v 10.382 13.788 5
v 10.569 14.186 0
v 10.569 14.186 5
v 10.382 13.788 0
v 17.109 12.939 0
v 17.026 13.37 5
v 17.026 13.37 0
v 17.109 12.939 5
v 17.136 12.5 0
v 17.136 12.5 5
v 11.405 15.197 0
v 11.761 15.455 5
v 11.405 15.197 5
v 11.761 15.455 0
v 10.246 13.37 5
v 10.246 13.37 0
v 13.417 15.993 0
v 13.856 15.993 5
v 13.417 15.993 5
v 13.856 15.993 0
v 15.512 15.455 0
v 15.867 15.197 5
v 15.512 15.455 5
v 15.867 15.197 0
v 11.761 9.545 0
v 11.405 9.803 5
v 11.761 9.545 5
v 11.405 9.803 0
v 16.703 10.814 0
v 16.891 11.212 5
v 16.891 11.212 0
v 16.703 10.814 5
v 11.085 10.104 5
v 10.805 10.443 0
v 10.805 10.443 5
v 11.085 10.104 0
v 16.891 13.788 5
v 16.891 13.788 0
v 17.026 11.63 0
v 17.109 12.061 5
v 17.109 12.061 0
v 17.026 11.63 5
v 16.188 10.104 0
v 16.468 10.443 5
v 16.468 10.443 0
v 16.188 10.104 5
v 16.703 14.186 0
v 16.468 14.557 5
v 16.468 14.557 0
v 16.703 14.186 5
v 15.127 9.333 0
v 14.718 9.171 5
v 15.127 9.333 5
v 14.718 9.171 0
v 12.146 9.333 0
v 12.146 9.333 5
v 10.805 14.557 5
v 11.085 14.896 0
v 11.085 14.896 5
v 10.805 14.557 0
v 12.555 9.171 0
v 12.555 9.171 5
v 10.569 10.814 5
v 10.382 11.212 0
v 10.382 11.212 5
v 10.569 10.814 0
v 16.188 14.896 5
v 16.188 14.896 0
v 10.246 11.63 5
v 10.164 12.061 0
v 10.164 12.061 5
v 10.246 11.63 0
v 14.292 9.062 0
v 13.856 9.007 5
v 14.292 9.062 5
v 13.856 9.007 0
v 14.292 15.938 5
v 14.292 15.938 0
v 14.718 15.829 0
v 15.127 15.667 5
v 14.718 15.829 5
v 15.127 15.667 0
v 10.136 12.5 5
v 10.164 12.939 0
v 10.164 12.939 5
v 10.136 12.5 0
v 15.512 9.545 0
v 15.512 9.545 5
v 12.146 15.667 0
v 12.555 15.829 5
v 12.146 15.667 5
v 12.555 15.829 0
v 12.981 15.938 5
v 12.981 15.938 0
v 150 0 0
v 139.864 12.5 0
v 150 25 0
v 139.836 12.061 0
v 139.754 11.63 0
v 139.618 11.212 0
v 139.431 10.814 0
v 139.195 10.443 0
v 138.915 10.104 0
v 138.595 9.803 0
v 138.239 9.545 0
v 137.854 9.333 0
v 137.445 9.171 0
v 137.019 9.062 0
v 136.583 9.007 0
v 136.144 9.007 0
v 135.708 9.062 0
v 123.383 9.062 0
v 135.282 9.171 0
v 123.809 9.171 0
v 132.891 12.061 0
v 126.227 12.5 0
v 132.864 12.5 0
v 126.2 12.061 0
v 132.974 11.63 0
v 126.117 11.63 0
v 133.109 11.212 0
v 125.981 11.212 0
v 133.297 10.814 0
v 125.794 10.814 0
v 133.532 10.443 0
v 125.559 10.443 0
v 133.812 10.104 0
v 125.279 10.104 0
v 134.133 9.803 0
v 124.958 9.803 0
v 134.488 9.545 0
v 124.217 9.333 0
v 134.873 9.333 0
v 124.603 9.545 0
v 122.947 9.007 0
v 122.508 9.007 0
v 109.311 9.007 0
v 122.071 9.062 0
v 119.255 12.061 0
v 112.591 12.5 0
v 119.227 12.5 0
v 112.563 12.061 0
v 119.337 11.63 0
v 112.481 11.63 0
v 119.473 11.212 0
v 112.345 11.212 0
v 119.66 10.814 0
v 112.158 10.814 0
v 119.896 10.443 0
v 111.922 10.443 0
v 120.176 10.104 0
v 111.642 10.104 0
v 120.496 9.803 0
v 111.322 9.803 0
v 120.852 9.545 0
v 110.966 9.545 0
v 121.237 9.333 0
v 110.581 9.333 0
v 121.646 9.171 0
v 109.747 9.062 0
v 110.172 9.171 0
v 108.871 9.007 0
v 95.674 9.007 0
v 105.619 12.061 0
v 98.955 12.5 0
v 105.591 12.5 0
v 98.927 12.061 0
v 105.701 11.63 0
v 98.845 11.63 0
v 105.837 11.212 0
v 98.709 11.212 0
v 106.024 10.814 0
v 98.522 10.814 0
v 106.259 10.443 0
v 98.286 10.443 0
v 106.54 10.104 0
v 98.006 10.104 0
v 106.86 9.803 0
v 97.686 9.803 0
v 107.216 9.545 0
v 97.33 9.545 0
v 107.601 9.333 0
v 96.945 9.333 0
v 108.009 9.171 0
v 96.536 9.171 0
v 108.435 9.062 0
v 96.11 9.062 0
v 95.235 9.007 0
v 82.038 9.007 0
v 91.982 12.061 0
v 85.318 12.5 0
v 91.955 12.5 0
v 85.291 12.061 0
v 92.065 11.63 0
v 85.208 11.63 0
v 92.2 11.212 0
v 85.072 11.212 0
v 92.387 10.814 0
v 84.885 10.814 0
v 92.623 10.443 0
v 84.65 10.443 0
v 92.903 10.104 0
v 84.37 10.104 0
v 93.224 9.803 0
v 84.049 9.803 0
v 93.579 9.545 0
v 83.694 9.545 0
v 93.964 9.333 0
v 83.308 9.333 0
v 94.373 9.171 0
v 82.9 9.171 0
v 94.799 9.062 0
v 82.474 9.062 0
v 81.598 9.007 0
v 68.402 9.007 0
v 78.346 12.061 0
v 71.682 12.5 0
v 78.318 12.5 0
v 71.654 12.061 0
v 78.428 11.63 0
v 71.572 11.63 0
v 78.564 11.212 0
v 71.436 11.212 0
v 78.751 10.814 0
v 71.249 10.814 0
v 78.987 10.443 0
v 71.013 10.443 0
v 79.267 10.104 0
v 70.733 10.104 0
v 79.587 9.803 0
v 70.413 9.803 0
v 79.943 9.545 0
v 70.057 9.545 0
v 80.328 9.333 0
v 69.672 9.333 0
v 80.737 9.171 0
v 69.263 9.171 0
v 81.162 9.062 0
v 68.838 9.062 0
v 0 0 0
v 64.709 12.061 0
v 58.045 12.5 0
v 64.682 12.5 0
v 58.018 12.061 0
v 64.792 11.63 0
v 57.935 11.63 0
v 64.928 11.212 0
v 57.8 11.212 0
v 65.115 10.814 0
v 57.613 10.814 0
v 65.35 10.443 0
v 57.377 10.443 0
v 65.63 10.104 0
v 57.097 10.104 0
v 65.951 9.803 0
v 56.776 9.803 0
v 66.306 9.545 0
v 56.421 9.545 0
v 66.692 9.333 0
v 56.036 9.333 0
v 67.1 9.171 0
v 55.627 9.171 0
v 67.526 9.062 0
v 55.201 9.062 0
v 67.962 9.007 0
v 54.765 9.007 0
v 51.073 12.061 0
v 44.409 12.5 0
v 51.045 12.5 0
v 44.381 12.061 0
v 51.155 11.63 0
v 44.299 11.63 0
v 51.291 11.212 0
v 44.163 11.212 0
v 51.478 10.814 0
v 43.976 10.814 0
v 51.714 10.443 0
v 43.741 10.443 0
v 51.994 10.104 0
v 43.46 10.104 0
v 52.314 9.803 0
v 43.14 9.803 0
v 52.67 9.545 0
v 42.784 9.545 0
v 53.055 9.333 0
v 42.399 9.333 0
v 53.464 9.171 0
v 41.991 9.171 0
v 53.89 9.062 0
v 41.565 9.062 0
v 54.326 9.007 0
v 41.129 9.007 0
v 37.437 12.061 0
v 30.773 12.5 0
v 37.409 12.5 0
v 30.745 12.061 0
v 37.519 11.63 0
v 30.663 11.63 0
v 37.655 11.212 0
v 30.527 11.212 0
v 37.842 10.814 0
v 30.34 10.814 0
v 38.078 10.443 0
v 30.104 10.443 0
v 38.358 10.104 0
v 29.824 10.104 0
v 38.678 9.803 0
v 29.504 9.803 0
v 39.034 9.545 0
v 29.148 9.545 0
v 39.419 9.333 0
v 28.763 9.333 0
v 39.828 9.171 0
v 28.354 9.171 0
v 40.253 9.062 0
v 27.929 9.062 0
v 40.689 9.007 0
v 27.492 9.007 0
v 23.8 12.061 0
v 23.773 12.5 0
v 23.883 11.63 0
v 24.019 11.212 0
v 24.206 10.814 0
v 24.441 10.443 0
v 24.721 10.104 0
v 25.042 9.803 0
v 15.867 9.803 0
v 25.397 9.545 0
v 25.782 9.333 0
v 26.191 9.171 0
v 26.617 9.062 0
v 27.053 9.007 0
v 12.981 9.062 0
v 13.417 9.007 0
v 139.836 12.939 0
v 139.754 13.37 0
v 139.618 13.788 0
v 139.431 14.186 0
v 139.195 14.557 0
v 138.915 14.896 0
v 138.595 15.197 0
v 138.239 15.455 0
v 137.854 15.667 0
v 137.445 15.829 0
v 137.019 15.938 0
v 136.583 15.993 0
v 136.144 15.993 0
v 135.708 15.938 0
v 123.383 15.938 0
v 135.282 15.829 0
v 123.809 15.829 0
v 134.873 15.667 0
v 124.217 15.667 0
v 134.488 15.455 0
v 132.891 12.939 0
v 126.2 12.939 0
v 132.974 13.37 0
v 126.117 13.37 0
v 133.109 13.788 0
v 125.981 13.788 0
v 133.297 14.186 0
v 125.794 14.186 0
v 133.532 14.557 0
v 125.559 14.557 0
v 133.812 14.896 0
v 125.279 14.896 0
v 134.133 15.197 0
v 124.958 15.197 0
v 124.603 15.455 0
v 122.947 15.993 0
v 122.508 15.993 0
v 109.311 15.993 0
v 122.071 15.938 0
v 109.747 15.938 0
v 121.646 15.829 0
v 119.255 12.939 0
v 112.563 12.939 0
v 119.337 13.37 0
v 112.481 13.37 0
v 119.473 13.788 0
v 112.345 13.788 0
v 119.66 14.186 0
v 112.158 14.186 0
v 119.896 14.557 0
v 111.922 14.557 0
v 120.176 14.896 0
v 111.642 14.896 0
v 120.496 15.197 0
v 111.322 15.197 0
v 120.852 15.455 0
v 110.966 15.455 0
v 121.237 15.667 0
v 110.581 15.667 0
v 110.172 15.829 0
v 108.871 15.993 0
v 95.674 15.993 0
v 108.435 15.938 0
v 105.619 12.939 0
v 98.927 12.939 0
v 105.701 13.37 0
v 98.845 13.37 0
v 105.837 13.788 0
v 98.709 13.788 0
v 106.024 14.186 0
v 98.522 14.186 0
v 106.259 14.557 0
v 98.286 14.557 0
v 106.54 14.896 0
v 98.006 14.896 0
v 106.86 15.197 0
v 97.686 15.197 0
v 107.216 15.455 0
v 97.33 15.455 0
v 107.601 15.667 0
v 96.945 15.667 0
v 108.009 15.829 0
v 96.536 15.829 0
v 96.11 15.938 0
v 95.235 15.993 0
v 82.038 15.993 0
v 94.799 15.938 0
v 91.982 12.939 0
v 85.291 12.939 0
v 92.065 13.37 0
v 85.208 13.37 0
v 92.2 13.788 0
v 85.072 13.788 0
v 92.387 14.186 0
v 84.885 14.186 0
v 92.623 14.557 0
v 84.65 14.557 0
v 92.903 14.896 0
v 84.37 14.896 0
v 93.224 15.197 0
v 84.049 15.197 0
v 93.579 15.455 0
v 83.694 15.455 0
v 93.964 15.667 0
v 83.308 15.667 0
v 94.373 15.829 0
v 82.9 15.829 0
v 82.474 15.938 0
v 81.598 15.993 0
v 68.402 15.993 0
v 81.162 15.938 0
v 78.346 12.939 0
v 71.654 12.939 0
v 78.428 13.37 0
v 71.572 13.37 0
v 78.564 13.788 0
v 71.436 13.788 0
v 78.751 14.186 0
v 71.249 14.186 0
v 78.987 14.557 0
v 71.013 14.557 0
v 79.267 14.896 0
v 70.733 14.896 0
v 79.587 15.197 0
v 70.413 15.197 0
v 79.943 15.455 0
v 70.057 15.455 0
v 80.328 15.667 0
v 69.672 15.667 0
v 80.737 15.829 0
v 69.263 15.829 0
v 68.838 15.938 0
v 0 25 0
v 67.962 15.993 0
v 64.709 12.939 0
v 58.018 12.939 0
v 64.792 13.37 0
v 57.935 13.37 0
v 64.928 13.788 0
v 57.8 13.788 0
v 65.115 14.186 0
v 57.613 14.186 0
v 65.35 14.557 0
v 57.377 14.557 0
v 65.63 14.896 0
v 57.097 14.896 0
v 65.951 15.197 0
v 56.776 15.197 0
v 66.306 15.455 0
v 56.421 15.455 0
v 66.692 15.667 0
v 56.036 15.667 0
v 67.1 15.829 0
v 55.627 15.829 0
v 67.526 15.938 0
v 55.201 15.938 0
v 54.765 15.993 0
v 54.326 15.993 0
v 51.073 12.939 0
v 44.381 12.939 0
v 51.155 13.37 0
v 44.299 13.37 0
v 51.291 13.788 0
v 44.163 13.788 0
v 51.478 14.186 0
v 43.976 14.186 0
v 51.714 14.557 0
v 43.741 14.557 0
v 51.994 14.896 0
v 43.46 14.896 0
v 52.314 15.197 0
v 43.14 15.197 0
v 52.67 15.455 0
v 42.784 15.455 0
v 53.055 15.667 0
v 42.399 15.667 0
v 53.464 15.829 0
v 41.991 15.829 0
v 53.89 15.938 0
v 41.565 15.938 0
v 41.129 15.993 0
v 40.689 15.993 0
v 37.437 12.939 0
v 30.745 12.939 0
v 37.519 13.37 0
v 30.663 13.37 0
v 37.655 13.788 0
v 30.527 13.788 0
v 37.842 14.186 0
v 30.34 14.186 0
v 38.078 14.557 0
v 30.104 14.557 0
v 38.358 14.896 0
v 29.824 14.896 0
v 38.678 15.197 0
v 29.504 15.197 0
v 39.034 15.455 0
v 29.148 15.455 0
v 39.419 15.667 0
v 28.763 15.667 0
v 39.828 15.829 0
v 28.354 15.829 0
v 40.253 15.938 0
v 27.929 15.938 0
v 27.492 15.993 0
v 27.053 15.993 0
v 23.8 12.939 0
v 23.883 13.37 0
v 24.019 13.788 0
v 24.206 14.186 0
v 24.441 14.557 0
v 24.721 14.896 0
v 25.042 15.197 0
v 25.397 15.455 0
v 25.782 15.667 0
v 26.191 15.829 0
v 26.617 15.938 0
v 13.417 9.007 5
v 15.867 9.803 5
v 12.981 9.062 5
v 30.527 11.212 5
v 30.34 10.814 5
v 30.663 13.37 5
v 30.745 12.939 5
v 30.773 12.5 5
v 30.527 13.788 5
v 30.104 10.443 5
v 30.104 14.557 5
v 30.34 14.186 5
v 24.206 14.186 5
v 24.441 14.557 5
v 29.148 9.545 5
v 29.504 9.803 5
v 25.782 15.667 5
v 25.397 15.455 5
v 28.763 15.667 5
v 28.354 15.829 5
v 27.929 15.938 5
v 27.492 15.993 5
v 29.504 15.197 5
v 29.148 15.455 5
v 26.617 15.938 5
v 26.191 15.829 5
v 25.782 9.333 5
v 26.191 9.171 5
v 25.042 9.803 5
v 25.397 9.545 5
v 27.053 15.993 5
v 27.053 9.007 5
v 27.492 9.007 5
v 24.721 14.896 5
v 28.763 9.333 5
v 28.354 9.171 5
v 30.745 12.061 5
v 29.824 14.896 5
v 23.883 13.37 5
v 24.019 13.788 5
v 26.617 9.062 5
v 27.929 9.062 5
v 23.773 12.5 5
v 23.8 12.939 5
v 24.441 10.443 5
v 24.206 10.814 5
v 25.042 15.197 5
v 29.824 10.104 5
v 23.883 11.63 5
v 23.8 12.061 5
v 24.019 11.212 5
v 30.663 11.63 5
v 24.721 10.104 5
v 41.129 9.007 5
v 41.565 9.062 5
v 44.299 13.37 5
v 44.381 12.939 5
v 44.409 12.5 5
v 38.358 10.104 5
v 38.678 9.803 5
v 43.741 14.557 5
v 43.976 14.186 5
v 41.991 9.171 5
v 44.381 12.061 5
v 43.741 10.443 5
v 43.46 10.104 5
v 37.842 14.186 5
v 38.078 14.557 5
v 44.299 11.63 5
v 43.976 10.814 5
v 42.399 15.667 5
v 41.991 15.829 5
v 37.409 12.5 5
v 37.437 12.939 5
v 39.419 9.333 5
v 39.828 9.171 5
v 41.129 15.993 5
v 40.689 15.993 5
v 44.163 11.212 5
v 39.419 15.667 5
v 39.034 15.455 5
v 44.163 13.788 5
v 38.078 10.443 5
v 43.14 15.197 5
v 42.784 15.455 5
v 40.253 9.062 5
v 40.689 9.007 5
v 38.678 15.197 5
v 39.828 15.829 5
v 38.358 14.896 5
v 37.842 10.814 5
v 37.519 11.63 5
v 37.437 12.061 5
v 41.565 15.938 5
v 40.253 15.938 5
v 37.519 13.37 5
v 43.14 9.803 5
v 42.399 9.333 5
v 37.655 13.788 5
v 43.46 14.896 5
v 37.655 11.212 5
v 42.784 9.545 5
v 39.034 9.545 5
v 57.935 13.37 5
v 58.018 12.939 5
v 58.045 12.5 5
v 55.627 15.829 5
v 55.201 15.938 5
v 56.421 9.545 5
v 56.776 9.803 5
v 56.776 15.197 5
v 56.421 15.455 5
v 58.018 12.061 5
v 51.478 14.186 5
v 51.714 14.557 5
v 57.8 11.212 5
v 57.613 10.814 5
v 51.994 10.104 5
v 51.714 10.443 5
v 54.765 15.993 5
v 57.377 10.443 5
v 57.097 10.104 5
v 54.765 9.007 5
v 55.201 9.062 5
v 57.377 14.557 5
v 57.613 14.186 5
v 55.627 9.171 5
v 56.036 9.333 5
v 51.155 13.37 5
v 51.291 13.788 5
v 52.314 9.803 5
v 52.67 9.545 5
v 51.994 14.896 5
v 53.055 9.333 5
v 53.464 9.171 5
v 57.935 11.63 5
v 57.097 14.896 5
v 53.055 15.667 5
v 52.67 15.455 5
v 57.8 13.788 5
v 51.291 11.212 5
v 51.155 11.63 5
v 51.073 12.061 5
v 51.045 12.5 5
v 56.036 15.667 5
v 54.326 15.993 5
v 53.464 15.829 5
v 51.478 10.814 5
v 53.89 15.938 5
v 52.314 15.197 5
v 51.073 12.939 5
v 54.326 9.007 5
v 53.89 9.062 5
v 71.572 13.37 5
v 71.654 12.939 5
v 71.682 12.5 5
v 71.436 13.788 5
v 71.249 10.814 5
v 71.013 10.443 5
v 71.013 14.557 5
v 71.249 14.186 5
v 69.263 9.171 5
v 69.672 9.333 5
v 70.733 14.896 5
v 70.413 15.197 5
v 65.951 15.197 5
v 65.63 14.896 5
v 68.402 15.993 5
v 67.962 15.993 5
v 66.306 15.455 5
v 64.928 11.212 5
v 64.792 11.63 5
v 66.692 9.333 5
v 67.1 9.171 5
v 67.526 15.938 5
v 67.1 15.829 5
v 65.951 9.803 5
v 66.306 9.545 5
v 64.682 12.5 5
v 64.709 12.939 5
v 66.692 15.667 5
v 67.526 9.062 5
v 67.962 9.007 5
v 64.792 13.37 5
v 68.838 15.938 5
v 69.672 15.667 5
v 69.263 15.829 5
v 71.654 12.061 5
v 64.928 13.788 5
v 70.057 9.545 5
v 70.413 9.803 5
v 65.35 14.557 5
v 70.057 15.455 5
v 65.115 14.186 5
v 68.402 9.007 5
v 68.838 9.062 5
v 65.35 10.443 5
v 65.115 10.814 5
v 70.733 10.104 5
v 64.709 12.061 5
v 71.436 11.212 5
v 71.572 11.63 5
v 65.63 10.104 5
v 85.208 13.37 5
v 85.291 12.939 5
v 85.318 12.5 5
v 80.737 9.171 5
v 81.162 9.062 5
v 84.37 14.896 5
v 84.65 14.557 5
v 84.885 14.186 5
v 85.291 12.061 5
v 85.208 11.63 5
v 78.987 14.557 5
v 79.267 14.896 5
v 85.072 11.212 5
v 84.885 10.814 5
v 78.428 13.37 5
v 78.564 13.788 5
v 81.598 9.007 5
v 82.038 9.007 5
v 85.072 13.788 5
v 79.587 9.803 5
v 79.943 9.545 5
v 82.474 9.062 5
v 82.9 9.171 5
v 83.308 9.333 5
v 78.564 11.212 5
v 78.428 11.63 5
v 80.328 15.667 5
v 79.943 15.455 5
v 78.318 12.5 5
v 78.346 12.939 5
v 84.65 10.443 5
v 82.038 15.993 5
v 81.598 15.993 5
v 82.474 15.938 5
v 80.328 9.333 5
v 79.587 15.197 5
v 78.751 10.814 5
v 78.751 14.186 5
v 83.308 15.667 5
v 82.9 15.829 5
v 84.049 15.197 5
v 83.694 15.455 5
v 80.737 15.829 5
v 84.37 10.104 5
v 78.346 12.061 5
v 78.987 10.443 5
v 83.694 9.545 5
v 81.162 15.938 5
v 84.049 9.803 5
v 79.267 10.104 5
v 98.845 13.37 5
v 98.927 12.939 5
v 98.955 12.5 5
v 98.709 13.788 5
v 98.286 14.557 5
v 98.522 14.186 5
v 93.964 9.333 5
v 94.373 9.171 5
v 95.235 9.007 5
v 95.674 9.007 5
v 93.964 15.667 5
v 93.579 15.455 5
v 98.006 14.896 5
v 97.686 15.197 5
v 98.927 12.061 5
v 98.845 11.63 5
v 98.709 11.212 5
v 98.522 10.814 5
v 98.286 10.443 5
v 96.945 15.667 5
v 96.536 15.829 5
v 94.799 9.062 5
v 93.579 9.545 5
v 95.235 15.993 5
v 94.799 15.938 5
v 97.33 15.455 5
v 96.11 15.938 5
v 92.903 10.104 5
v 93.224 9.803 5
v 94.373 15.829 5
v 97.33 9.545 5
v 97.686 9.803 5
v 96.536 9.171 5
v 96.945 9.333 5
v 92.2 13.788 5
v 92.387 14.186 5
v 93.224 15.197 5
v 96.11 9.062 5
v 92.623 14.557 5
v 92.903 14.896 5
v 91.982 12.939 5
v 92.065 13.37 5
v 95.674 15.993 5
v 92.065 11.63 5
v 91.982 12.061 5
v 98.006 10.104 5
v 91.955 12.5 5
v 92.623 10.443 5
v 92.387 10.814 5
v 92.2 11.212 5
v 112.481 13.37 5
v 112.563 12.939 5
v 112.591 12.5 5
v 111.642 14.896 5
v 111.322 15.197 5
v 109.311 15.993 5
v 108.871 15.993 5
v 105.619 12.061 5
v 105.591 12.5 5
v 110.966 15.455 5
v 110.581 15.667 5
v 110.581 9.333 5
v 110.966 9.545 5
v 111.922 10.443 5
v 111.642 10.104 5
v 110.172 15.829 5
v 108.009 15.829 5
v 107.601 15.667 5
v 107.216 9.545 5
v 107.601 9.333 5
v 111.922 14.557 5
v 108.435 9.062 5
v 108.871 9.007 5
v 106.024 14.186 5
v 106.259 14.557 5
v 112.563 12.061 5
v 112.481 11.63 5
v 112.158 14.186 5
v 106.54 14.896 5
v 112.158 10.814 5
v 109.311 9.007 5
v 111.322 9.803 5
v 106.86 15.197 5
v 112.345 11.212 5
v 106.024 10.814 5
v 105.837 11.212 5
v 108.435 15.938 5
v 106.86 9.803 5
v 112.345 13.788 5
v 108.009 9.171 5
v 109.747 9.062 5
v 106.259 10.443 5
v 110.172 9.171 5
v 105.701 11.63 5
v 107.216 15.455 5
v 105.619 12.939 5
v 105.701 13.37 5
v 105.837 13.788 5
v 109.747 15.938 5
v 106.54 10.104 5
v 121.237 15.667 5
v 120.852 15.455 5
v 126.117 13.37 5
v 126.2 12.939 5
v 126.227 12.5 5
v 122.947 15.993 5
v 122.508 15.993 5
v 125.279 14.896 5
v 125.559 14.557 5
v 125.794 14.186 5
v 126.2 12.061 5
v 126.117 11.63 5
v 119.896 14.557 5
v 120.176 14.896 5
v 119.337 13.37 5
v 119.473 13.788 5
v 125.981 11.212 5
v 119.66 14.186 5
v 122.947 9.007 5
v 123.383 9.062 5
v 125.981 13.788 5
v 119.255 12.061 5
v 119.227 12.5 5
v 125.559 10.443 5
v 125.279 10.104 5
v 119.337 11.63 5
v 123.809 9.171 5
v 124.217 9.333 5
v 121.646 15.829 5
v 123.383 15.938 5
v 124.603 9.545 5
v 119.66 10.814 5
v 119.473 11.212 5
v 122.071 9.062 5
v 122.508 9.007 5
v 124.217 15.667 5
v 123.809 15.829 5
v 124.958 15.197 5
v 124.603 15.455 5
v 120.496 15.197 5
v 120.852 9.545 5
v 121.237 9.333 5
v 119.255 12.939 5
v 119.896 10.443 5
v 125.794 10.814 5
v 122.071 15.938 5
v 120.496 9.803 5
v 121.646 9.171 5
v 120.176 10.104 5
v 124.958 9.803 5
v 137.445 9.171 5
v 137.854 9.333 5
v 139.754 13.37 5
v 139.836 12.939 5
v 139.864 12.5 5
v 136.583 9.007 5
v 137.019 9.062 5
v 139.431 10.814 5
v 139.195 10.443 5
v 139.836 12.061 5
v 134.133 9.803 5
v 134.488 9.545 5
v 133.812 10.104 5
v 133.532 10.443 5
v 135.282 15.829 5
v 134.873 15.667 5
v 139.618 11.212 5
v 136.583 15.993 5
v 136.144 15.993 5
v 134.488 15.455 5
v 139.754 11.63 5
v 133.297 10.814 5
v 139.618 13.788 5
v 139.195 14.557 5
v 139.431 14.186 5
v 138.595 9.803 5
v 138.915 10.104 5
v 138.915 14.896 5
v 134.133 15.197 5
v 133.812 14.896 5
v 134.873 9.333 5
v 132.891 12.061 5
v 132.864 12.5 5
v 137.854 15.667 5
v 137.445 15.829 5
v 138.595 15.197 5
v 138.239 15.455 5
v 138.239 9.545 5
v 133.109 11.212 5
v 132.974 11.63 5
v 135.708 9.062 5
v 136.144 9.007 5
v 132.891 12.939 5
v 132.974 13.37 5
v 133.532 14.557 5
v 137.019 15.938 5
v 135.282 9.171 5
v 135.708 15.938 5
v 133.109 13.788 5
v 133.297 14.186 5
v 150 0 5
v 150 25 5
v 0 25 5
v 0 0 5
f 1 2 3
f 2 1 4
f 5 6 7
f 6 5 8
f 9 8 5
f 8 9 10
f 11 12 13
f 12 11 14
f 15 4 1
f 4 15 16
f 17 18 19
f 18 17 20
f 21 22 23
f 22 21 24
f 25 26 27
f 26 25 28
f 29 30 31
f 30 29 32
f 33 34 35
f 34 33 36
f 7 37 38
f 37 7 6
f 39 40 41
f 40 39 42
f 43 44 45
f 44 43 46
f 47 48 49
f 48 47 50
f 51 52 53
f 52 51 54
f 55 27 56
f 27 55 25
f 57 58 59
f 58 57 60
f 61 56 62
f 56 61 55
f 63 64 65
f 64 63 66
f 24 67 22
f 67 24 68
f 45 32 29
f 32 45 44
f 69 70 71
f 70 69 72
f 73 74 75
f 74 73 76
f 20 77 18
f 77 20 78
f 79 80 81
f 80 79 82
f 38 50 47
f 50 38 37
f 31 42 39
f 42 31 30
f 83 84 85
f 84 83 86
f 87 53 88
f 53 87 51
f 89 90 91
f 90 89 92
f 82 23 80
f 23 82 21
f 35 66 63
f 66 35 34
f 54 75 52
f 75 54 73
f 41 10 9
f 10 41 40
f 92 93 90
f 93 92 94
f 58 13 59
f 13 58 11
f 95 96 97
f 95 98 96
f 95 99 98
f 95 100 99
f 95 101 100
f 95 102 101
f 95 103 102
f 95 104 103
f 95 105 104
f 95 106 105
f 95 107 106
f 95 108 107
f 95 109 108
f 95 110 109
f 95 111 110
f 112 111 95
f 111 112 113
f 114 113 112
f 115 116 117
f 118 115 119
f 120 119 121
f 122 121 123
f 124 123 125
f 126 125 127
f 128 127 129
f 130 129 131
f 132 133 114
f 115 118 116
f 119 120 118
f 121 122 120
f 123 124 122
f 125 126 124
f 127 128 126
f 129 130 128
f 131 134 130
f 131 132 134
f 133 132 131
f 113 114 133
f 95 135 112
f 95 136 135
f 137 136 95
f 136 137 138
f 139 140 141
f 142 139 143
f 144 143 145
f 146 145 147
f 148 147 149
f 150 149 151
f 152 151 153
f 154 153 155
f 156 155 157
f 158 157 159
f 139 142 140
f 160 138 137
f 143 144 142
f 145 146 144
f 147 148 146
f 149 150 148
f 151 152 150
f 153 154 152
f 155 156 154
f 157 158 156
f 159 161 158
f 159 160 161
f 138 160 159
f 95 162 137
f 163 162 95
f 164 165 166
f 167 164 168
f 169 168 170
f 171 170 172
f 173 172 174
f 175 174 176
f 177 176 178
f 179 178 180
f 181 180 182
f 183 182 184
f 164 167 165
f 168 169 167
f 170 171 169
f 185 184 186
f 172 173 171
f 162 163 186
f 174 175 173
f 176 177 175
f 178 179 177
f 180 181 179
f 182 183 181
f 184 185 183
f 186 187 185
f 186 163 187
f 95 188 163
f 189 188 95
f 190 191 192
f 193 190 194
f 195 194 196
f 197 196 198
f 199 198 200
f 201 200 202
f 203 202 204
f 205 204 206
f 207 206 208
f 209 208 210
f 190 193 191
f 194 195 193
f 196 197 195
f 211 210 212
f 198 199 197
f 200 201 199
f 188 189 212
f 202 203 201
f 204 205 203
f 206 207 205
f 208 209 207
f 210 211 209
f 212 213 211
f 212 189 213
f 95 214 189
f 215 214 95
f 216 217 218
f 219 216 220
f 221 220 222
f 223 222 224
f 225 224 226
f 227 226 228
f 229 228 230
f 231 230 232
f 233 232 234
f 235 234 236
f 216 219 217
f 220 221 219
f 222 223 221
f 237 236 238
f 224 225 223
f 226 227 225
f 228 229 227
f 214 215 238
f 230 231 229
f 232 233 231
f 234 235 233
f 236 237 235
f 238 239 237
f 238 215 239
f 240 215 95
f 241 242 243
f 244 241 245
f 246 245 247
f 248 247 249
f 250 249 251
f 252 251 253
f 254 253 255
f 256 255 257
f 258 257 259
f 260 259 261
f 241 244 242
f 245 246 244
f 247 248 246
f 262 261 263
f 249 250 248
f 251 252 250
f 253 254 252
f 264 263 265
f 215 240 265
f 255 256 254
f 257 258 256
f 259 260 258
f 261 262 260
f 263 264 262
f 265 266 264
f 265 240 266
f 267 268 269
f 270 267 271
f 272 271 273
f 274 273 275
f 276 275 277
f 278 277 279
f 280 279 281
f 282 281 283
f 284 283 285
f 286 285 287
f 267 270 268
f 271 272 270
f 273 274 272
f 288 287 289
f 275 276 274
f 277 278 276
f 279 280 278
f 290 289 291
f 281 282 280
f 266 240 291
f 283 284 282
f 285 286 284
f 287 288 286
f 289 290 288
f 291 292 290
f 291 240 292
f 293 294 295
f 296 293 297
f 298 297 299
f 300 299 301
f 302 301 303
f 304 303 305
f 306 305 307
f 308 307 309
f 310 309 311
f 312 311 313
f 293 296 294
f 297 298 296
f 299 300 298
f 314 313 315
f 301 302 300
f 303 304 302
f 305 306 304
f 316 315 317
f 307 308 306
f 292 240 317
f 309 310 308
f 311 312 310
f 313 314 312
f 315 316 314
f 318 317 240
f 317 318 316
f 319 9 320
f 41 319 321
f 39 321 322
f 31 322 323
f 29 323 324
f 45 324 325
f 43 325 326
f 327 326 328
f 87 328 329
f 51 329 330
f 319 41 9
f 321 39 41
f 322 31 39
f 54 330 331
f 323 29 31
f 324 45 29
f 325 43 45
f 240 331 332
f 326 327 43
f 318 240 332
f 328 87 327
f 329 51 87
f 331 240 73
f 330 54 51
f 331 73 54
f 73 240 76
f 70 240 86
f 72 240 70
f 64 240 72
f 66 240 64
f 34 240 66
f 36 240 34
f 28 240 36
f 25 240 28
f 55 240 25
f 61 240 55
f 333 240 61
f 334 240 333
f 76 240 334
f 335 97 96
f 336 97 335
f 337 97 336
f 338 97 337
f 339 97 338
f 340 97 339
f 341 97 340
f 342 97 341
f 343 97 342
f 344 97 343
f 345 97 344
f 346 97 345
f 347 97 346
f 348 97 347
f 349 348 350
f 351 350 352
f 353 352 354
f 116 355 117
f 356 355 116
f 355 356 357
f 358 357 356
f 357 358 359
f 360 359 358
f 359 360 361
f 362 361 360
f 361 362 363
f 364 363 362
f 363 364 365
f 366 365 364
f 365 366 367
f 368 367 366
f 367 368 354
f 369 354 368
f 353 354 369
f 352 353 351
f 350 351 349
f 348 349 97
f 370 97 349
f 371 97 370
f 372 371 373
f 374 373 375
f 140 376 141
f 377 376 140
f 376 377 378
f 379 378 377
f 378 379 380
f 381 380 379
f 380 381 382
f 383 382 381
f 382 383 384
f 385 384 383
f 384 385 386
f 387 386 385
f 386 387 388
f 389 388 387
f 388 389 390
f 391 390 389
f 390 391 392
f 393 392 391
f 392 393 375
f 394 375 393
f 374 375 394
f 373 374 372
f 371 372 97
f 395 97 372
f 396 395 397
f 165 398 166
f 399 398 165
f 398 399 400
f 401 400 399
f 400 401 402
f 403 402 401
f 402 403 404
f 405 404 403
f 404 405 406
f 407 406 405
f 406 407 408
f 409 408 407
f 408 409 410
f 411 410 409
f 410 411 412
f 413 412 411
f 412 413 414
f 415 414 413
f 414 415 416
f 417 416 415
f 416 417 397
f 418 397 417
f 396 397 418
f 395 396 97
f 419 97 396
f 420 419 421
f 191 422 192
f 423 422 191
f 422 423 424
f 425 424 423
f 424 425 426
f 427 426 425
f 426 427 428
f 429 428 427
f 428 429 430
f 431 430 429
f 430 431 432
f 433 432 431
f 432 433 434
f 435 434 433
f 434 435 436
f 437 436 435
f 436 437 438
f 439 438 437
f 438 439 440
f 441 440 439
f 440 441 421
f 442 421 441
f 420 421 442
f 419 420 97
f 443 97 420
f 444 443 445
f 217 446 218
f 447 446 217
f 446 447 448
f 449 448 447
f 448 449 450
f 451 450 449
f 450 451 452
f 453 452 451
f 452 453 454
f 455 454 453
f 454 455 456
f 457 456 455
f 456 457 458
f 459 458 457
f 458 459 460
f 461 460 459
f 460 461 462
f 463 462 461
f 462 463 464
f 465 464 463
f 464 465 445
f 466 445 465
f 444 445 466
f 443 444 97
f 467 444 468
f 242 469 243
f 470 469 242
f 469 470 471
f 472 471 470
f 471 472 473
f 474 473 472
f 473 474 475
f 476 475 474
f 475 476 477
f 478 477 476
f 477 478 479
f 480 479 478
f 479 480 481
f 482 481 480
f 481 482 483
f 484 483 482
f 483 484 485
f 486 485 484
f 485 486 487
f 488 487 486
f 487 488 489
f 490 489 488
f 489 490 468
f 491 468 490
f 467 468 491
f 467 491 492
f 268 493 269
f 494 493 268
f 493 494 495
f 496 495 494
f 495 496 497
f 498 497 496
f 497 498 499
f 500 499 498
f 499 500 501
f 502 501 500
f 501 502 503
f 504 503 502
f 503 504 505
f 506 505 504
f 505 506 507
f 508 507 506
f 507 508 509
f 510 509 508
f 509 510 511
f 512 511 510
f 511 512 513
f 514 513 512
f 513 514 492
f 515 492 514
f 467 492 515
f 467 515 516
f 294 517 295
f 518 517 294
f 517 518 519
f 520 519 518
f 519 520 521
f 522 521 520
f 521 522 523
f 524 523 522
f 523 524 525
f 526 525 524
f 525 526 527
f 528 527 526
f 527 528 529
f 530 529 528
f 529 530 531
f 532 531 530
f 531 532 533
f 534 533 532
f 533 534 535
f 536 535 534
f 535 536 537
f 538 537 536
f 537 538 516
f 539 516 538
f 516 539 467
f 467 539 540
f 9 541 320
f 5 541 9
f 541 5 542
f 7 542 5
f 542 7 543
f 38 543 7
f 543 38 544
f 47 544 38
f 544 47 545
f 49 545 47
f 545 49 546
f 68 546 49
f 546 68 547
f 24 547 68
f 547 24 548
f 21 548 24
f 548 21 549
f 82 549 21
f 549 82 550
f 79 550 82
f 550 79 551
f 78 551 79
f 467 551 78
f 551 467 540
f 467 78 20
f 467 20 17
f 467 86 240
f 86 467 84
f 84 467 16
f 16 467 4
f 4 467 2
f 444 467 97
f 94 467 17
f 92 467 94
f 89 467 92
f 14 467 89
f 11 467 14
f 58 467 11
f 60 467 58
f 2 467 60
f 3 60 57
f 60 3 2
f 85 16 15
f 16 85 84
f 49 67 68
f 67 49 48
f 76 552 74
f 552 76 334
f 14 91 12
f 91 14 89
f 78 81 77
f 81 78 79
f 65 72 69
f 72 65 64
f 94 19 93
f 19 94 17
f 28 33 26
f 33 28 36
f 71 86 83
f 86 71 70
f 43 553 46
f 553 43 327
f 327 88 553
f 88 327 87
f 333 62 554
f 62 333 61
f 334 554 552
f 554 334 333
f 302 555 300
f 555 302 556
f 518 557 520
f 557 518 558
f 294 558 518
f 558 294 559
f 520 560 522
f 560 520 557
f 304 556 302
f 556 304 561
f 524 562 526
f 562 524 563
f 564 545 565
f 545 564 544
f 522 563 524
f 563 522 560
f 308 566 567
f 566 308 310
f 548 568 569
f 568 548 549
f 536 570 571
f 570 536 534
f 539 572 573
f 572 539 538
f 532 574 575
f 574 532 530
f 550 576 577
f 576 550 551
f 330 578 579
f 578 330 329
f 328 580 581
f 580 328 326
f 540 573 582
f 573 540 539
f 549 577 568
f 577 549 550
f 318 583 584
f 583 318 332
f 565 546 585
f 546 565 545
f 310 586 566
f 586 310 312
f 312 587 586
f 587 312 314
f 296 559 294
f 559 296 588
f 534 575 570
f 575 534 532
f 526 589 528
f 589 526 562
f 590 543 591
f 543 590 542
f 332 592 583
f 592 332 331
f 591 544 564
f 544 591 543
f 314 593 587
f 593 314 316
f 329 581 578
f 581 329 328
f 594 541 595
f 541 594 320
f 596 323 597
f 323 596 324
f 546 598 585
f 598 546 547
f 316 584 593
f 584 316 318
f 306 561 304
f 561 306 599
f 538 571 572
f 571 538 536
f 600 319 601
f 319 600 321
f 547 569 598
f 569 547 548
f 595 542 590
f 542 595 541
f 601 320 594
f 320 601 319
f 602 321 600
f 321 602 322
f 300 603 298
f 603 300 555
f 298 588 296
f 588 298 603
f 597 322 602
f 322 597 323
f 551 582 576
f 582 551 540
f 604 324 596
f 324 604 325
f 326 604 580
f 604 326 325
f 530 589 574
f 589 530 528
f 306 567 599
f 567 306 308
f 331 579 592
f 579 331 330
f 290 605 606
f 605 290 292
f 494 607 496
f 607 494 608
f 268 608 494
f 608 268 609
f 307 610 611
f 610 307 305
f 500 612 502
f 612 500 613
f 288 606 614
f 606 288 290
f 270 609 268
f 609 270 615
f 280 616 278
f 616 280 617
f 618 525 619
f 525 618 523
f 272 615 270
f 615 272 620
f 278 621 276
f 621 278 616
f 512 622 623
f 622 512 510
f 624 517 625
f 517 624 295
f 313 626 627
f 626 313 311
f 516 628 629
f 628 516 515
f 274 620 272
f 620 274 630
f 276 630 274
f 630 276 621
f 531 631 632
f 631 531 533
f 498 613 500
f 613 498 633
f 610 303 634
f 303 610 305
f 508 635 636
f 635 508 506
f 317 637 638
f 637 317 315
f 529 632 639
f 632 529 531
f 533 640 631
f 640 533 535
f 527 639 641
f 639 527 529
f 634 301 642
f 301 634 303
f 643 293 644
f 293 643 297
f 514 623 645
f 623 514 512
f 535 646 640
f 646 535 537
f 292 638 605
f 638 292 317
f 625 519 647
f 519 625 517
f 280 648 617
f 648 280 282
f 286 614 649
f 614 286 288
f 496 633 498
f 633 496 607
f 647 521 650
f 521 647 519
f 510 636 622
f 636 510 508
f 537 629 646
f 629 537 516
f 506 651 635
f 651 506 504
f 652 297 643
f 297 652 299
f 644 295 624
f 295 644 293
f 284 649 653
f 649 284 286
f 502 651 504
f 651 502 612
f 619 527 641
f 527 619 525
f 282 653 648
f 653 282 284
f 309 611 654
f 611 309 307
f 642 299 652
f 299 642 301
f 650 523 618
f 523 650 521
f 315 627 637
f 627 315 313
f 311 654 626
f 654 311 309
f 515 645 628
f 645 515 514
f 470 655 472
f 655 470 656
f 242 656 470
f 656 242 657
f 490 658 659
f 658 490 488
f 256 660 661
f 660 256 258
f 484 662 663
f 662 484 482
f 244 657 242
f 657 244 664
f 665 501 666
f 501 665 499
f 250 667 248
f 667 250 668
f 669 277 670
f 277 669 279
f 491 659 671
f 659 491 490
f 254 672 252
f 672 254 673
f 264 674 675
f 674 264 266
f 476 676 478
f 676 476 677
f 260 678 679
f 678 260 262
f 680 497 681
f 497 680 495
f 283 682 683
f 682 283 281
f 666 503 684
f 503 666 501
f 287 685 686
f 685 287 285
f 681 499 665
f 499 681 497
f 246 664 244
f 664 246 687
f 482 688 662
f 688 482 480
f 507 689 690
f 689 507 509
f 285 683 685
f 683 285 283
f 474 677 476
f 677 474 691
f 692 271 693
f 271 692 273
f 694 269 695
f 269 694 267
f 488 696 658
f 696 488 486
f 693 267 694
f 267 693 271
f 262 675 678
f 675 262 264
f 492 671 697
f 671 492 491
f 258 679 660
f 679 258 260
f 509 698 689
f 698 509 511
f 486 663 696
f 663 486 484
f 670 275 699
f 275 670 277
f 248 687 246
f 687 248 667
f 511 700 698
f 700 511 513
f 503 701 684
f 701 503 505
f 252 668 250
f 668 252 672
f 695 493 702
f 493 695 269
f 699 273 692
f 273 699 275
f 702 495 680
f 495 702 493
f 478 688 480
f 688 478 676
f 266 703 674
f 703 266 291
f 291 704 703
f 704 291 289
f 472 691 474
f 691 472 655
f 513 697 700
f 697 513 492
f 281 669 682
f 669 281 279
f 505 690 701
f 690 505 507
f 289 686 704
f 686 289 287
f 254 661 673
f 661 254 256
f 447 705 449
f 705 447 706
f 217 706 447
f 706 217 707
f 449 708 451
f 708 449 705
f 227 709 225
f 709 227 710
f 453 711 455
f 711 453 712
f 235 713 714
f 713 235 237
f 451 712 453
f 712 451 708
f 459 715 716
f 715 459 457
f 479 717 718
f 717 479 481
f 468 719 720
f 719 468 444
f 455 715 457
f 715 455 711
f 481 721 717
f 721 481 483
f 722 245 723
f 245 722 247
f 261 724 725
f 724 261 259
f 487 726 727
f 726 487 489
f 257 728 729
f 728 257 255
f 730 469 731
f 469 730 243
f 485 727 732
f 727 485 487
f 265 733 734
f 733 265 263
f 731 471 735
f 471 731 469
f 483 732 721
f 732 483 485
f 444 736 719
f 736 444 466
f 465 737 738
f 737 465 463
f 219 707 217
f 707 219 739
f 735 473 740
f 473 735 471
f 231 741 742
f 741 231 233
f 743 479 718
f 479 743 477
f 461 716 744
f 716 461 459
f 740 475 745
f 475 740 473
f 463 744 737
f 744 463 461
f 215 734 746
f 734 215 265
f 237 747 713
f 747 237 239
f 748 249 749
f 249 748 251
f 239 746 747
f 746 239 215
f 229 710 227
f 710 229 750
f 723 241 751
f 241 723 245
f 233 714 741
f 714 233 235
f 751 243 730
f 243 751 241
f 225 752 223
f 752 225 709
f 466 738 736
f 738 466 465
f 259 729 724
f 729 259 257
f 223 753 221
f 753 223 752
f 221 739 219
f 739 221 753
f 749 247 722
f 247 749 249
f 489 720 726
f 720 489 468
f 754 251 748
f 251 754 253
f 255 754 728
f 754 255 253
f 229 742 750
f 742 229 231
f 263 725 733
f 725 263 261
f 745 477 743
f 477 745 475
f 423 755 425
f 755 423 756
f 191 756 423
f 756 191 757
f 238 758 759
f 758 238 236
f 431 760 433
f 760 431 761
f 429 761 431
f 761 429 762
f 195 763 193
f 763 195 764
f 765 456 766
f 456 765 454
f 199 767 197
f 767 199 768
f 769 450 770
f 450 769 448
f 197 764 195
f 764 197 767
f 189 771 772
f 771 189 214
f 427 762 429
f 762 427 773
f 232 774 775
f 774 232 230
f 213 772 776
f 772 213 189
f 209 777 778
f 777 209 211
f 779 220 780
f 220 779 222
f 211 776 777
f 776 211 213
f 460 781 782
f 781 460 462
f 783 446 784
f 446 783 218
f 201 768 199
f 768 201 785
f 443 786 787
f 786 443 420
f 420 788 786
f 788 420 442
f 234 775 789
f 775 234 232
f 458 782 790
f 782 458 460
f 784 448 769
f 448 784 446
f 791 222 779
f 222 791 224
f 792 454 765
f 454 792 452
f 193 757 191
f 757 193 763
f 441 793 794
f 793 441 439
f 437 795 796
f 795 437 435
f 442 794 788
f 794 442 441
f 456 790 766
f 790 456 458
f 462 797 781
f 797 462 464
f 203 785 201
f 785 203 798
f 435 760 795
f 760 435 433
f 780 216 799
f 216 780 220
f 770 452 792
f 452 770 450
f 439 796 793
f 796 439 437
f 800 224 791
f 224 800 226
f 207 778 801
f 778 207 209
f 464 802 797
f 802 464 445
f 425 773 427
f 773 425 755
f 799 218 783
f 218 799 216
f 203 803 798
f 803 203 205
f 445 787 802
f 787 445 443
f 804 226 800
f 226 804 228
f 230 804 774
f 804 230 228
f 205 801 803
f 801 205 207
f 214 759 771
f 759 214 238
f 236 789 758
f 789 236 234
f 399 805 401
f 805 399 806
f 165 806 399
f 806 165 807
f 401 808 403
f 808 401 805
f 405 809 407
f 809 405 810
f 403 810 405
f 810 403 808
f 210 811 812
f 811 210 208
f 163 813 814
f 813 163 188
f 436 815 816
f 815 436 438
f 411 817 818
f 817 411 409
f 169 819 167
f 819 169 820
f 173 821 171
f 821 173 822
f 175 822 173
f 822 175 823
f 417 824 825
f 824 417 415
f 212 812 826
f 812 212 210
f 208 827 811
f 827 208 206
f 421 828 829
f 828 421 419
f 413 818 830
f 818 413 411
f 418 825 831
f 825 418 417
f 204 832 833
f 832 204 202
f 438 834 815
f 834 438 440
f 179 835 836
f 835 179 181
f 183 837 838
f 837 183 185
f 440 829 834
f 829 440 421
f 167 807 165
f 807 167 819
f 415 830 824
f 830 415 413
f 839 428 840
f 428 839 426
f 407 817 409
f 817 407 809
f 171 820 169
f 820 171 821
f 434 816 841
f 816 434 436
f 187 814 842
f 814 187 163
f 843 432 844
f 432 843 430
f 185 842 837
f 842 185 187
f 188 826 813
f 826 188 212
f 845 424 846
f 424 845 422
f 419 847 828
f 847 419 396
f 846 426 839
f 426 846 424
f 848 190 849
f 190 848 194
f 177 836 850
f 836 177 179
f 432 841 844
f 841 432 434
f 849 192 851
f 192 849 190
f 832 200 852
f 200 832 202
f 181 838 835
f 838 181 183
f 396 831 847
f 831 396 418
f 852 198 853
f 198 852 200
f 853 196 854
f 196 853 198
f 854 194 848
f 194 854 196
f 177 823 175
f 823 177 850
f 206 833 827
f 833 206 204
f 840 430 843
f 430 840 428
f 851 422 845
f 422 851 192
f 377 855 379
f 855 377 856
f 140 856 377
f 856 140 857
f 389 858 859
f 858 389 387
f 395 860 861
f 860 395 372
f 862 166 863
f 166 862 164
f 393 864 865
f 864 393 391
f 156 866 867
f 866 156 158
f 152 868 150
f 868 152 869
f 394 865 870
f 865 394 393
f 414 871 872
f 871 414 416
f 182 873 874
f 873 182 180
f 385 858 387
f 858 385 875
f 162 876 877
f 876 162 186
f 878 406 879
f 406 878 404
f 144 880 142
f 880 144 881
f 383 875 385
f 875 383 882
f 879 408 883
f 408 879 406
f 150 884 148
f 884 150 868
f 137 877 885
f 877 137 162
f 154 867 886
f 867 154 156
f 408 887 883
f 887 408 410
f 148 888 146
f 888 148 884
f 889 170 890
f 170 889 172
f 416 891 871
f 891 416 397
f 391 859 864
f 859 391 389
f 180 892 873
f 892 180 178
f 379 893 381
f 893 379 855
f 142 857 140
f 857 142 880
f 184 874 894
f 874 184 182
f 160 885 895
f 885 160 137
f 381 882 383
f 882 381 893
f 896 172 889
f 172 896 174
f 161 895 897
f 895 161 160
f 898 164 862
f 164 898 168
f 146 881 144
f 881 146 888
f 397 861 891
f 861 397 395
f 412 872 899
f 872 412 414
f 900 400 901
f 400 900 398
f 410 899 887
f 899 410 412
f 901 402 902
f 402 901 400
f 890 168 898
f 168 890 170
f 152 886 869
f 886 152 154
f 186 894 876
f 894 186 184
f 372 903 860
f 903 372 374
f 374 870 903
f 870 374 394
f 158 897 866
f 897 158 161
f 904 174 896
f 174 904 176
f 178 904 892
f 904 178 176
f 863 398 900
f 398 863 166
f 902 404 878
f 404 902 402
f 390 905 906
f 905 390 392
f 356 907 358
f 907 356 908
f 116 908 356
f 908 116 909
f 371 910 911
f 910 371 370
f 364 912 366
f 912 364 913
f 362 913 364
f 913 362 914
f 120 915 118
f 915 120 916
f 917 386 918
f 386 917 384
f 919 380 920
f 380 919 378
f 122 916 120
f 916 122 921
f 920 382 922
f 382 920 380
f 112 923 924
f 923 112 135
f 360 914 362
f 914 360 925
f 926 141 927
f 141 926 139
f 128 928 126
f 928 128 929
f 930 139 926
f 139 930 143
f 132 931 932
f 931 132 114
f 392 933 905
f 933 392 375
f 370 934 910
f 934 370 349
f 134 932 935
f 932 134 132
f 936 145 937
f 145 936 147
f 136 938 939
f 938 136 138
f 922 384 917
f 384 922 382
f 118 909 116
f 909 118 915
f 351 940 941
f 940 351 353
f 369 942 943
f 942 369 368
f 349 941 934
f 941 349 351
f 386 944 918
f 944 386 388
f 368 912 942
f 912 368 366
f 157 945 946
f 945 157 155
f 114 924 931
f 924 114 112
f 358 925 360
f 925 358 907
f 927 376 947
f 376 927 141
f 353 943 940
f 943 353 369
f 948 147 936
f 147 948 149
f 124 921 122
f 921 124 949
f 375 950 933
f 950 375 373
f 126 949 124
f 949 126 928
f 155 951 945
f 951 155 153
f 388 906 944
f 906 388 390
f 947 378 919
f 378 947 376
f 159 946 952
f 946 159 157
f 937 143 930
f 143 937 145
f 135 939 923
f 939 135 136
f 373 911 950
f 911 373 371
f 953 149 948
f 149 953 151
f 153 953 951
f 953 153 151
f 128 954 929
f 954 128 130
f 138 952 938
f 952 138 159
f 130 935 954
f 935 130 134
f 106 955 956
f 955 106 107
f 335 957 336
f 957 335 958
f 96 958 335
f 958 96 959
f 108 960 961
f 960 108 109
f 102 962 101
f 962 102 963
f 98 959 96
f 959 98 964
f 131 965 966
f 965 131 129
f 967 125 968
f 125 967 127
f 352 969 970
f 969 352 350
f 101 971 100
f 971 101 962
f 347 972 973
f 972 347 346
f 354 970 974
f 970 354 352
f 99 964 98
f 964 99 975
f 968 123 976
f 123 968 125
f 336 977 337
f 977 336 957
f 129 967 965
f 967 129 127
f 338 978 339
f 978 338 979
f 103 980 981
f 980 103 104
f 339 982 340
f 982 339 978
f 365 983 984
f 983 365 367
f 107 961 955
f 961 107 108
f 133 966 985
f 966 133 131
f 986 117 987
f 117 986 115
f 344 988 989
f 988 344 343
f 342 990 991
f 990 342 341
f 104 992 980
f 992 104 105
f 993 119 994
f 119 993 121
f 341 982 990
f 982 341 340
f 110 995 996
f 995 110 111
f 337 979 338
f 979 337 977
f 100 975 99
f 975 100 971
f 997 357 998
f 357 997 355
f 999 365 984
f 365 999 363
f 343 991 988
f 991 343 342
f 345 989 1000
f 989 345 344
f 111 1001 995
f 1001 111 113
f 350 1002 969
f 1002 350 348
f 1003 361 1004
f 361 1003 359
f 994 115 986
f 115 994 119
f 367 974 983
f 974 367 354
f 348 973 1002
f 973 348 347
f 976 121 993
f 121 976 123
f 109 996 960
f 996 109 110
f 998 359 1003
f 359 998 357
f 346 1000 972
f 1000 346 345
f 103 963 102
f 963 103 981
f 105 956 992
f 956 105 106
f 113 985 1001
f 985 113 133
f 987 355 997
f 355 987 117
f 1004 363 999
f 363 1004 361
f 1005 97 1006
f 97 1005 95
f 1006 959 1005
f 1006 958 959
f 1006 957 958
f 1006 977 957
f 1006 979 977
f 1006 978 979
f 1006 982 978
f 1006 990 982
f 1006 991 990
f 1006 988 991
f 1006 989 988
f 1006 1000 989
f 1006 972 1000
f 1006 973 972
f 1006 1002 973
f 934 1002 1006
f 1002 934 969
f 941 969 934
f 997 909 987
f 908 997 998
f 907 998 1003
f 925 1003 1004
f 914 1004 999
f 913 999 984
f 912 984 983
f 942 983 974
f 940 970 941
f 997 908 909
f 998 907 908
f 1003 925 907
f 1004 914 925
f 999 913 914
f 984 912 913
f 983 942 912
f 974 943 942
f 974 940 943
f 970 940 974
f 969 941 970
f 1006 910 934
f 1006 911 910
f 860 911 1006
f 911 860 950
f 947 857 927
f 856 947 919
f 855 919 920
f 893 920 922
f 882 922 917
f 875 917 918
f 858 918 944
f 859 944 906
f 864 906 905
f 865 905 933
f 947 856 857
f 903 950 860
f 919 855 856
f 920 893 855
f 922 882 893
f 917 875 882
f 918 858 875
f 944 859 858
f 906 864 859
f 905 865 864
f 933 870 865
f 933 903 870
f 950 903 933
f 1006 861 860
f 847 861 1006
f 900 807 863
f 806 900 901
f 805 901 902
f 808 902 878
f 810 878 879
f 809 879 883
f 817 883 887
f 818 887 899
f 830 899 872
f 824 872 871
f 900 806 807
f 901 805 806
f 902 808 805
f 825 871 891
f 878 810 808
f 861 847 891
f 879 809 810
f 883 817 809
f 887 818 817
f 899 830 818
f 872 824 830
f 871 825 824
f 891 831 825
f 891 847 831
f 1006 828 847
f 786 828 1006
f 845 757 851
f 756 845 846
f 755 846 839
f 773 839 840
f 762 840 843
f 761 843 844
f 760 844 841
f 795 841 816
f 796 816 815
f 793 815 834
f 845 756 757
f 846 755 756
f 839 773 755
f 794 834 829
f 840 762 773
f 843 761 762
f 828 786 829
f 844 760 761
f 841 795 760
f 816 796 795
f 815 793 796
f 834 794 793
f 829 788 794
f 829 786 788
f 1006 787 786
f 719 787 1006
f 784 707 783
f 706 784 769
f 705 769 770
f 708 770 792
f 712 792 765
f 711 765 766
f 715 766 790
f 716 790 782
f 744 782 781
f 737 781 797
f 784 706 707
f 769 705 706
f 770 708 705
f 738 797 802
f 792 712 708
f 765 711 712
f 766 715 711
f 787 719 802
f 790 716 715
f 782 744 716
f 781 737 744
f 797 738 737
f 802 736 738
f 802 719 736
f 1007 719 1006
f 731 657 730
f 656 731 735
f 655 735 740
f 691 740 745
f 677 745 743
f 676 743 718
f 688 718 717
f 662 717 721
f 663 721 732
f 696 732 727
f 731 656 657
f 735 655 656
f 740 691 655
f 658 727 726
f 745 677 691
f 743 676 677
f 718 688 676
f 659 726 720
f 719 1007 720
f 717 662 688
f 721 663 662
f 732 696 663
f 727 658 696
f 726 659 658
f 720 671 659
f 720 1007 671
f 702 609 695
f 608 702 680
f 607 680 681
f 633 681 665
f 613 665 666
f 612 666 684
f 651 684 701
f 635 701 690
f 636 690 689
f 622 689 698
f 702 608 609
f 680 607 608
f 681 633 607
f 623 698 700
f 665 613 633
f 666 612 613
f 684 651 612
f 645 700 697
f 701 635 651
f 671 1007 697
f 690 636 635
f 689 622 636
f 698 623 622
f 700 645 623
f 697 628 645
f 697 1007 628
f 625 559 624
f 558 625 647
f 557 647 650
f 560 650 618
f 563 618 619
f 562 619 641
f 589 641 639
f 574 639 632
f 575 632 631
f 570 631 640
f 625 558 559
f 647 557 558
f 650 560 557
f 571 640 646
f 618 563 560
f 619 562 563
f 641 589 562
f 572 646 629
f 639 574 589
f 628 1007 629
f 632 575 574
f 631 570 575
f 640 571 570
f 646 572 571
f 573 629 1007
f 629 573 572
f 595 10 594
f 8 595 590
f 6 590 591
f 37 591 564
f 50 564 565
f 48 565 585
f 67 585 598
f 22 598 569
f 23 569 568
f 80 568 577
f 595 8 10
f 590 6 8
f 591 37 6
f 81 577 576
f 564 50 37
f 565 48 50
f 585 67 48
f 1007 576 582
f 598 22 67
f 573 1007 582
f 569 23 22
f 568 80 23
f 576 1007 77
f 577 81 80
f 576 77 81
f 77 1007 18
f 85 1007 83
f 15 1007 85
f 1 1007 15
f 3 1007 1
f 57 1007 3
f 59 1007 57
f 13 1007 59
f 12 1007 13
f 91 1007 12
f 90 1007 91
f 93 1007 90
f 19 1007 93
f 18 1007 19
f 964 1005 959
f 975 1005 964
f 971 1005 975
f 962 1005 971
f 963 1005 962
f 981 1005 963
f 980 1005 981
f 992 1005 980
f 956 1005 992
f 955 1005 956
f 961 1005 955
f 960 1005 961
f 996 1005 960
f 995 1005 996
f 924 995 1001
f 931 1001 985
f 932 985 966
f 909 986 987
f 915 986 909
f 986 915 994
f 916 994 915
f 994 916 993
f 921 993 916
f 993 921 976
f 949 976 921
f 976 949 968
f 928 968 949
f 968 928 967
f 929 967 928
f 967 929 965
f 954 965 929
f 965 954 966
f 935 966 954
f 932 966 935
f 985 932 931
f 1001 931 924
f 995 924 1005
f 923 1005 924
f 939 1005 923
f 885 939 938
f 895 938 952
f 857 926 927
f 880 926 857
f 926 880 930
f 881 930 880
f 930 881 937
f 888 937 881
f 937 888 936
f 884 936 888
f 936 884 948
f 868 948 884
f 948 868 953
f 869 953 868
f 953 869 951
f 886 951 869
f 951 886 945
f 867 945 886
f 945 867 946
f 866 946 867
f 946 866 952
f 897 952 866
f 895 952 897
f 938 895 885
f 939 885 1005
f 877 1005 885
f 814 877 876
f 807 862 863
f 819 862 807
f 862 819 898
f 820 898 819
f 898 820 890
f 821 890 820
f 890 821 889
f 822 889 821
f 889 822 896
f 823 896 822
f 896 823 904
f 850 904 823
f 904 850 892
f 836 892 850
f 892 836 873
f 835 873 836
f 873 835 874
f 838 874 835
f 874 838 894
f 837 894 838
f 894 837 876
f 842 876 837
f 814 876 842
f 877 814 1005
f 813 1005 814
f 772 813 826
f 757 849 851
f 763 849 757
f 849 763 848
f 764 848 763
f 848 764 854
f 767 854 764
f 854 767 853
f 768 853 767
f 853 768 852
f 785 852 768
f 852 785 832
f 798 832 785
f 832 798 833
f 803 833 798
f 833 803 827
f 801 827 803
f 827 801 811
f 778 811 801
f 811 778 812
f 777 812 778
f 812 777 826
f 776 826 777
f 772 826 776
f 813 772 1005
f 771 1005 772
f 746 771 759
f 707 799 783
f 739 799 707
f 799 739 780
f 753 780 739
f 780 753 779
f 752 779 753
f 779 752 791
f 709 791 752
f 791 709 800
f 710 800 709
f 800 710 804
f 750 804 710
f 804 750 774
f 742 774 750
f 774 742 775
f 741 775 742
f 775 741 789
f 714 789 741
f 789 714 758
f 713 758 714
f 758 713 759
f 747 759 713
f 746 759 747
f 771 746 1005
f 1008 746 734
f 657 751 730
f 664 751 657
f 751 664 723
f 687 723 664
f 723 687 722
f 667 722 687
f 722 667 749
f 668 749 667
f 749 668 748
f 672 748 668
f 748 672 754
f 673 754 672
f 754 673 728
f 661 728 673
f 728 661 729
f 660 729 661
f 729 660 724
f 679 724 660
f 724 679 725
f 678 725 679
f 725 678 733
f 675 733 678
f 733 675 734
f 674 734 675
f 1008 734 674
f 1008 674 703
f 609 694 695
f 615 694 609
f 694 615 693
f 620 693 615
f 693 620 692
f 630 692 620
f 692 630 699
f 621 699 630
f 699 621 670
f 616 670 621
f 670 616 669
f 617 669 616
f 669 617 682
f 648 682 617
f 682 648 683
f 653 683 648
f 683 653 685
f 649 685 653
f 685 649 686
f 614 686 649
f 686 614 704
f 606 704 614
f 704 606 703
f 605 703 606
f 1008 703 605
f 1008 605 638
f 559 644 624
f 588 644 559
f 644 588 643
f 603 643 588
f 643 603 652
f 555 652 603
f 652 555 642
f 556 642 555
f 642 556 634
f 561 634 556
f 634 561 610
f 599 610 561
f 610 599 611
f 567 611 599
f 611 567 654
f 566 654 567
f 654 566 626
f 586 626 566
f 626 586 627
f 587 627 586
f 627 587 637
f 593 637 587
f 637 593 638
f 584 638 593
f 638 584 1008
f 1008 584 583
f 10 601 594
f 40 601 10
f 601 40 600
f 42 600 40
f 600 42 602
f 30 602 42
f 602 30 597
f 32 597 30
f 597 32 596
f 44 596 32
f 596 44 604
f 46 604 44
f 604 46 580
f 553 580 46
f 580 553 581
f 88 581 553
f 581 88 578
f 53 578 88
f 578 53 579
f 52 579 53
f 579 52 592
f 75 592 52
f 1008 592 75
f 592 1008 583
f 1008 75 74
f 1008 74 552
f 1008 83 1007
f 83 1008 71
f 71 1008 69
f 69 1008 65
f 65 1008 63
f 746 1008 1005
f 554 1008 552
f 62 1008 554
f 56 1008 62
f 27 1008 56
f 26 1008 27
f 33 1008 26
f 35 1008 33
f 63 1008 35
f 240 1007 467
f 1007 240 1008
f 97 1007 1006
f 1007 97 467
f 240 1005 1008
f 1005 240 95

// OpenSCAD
// Parameters
cube_length = 150;
cube_width = 25;
cube_height = 5;
hole_diameter = 7;
num_holes = 10;
hole_spacing = cube_length / (num_holes + 1); // Space between holes to make them equidistant

// Main cube
difference() {
    // Create the base cube
    cube([cube_length, cube_width, cube_height]);
    
    // Create the holes from top to bottom
    for (i = [1 : num_holes]) {
        translate([i * hole_spacing, cube_width / 2, 0]) 
            cylinder(d = hole_diameter, h = cube_height + 1, $fn = 50); // +1 to ensure it cuts through
    }
}
